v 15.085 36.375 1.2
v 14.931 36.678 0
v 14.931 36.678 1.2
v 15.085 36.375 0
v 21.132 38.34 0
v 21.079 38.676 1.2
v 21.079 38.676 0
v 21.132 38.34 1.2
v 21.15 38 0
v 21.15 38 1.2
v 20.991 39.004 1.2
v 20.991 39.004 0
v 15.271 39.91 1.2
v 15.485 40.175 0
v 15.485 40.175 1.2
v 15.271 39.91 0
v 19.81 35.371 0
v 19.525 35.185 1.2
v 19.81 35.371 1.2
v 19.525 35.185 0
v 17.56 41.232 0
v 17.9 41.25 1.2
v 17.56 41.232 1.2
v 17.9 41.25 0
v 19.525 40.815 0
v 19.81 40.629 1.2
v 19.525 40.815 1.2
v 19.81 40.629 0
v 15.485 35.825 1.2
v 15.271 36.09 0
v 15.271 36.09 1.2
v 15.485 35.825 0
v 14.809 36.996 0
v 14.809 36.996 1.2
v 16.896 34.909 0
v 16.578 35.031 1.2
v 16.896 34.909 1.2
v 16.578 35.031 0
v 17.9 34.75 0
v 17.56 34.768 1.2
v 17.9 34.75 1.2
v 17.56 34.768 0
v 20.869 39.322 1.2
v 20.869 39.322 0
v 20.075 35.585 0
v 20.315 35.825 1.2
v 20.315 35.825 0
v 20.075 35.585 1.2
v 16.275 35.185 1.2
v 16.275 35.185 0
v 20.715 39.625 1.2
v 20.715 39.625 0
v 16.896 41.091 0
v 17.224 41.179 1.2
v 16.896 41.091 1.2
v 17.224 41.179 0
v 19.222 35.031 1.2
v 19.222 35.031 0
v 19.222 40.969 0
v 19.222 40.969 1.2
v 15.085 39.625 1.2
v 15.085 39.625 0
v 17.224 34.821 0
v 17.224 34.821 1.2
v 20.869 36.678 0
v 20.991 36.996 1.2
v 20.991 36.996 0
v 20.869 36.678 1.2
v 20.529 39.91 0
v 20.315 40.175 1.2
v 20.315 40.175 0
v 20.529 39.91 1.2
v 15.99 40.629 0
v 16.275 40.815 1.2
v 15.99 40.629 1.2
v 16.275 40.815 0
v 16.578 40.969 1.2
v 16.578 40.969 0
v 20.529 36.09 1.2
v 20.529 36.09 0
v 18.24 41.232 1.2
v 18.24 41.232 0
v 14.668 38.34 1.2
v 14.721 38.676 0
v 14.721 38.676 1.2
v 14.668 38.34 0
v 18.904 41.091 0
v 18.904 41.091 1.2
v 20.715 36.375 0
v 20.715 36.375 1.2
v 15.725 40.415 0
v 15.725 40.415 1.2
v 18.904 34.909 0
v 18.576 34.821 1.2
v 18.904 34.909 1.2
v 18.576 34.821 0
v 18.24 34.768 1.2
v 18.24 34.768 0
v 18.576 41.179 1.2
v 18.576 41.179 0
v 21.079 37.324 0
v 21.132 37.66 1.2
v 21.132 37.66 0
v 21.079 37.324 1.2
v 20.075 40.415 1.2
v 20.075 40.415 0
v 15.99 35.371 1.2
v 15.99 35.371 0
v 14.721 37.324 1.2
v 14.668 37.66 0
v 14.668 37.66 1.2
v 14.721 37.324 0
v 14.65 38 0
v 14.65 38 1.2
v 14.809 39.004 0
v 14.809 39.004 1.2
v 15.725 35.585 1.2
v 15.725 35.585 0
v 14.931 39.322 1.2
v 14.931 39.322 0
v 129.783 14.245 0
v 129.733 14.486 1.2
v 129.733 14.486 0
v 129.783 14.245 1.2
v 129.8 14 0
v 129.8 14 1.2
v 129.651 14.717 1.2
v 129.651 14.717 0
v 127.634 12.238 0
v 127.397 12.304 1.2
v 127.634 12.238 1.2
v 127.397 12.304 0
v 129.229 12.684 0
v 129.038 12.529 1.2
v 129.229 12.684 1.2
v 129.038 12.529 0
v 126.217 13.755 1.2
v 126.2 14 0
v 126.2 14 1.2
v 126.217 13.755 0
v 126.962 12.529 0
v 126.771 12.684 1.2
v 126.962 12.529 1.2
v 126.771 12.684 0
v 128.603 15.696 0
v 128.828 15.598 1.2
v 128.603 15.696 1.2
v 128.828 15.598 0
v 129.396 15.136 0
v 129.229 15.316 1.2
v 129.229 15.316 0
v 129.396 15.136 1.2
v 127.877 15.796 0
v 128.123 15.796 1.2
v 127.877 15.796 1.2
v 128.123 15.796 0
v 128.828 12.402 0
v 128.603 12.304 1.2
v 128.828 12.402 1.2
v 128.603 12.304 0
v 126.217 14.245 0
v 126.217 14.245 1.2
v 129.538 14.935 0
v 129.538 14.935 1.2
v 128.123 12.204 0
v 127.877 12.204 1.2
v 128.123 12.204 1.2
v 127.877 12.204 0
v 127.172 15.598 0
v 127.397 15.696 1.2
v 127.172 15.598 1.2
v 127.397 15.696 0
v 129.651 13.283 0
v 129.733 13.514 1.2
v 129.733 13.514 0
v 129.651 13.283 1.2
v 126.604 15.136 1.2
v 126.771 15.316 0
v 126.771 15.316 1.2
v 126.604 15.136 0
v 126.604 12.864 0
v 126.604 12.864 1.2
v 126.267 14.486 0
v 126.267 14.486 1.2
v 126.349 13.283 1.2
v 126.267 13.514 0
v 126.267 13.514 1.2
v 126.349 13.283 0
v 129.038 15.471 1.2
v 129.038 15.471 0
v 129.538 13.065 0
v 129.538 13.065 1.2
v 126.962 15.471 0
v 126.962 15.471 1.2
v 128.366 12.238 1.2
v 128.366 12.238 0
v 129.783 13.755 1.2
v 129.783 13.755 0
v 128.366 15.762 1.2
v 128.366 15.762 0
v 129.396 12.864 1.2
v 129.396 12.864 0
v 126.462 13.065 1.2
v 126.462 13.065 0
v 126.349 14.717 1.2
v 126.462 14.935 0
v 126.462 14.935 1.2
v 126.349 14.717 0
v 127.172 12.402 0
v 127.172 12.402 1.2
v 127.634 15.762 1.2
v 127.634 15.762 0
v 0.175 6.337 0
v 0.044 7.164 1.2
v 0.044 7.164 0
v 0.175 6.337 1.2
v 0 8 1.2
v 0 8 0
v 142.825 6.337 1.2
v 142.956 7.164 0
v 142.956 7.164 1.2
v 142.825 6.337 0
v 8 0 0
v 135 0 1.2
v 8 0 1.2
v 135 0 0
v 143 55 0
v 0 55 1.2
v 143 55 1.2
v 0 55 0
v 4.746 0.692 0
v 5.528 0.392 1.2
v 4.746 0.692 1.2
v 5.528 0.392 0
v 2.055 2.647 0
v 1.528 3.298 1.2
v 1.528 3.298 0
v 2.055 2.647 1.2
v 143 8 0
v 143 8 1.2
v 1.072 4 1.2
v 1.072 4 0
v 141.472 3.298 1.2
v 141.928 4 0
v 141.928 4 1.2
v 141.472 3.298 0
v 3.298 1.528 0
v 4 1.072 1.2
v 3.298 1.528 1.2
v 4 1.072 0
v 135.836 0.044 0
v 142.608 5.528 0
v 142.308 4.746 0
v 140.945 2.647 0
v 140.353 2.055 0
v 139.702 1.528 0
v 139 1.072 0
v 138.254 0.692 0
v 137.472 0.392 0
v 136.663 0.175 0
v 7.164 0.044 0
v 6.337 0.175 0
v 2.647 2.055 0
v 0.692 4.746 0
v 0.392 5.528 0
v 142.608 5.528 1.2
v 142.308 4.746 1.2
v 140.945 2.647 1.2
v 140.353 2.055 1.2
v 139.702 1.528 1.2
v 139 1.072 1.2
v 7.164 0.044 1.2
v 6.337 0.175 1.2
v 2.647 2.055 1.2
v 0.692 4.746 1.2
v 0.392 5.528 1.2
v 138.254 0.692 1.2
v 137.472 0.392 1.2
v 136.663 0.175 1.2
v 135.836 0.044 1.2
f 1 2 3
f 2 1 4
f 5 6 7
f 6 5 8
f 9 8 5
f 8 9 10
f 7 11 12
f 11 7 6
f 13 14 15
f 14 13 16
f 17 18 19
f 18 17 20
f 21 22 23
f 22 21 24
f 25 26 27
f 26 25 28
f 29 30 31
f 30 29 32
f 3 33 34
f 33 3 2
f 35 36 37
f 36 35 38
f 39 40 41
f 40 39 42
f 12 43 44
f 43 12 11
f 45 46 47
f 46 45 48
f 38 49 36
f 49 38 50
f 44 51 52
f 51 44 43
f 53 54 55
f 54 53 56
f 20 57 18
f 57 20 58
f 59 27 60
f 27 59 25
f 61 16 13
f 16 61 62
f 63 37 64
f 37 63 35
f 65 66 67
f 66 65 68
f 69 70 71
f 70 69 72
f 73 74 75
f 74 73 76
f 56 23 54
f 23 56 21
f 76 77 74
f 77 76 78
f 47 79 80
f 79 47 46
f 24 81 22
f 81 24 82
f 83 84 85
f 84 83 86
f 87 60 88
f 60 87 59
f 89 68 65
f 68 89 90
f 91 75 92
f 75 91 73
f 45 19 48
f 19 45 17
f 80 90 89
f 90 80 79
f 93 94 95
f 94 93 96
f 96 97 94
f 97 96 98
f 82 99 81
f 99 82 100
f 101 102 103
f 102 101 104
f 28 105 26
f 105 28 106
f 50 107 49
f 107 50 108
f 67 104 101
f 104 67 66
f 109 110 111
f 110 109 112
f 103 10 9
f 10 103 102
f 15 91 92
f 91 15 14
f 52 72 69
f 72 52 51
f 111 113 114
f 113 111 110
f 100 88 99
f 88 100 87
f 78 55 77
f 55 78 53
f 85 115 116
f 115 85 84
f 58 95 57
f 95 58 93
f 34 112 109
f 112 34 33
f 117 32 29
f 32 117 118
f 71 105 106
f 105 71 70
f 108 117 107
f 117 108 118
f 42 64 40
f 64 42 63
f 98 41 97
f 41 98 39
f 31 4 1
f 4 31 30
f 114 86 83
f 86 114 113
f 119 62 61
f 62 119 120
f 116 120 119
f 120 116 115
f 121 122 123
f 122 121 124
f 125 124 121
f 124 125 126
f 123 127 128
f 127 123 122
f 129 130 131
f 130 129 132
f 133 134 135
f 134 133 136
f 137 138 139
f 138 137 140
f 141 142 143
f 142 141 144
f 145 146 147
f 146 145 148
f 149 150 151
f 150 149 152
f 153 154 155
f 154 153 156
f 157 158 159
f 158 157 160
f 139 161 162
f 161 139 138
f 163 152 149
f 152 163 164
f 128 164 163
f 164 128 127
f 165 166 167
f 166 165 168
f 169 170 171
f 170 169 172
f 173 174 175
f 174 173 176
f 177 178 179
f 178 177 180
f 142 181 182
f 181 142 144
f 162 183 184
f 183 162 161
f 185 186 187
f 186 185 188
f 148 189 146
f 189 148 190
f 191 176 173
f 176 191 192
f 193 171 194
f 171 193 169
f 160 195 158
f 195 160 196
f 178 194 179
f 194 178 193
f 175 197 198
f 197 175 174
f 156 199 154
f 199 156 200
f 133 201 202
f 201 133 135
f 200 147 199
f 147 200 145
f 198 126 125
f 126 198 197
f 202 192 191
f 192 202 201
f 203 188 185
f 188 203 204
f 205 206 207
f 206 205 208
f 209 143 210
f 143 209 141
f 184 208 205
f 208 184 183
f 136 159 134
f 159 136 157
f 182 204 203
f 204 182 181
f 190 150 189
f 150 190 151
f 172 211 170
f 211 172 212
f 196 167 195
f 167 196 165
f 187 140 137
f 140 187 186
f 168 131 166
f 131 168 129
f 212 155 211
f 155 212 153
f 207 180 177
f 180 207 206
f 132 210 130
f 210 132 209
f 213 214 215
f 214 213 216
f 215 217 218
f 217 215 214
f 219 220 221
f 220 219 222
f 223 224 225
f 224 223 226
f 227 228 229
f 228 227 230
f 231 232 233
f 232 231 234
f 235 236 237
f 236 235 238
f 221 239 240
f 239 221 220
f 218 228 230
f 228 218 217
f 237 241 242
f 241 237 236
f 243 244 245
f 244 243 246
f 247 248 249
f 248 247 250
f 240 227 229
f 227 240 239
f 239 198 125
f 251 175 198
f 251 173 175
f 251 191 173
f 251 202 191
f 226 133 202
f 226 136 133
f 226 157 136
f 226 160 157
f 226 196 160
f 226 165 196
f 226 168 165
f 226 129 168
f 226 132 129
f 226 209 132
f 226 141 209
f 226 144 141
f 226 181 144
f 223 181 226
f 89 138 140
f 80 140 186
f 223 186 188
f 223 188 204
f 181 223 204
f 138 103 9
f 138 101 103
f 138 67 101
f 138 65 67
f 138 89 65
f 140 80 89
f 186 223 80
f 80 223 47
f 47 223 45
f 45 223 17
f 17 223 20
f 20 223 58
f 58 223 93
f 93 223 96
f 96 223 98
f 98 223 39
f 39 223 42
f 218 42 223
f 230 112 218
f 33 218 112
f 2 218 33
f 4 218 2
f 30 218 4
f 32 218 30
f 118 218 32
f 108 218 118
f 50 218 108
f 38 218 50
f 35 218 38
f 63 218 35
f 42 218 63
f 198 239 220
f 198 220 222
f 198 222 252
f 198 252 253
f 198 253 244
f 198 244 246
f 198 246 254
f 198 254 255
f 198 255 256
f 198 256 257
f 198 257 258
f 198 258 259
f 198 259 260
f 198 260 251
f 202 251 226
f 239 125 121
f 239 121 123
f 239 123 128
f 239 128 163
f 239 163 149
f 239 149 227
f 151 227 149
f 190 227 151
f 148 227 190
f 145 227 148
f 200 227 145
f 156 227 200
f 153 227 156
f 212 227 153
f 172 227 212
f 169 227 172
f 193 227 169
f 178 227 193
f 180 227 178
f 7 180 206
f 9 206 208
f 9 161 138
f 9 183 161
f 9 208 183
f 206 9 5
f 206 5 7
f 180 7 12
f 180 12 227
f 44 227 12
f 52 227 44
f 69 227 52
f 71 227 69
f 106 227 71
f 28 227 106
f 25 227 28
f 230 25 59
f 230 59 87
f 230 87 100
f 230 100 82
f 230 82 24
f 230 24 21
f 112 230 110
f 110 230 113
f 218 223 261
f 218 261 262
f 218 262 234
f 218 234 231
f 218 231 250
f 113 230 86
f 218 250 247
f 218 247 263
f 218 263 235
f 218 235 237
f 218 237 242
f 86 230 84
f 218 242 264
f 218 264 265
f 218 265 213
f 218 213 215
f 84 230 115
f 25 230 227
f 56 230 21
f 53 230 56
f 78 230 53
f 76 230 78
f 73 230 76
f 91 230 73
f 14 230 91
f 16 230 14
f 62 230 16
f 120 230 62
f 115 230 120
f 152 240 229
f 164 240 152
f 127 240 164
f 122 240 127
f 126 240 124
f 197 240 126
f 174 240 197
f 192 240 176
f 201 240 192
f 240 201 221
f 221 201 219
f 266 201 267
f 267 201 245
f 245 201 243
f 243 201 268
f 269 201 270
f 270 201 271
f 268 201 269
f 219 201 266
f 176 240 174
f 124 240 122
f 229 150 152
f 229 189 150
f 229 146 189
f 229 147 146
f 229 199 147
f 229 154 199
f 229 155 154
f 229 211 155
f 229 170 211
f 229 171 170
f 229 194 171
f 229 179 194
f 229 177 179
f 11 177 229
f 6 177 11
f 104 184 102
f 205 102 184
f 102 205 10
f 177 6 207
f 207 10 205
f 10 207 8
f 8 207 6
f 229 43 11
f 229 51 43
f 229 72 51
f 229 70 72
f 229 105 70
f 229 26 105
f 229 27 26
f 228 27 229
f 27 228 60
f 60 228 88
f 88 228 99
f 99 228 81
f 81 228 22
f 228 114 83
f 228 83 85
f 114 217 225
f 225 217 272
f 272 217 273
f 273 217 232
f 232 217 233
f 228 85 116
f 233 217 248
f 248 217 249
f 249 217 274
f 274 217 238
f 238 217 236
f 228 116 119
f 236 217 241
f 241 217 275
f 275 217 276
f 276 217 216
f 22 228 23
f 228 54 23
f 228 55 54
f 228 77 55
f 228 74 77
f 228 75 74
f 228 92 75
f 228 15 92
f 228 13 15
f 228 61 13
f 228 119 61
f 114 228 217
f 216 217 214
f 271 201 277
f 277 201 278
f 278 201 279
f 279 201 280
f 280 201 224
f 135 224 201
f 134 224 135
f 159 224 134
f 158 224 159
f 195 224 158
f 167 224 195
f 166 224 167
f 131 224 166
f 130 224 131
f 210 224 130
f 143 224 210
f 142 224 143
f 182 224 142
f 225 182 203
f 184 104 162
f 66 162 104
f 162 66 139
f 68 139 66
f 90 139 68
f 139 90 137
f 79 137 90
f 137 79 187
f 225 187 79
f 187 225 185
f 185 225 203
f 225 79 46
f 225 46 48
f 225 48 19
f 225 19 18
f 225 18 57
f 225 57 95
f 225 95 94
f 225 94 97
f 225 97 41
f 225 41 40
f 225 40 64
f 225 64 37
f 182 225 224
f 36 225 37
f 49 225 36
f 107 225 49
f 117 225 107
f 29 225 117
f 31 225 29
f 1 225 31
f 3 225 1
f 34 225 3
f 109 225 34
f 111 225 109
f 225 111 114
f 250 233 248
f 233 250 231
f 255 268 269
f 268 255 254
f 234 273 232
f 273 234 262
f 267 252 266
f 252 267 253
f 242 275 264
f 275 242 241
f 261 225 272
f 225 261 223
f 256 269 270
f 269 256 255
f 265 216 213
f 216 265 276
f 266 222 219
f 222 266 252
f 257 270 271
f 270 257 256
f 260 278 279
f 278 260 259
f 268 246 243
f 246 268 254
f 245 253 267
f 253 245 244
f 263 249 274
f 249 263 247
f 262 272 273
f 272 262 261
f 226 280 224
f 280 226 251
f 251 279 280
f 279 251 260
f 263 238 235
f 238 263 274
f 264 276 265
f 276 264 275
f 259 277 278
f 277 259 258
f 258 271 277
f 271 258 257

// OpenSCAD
// =============================================
// 3D: nux mighty air cover
// Version: 1.0
// Author: generator
// =============================================

description = "Thin cover plate 140.9x52x1 mm, bottom corners R5, two holes";
version_str = "1.0";

// ----------------------------
// Фрагменты: назовите элементы короткими именами с _
// - base: основная деталь
// - TODO: top_pad, base_pad, wrap_left, main_wall: примеры имён
// ----------------------------

// Параметры модели (position: front at XZ axis, top view at XY, side view at YZ)
// base x, y, z указаны для внешних габаритов. Внутренние размеры меньше на ширину стенок
// ----------------------------
base_x = 143; // ширина X, мм, width
base_y = 55; // глубина Y, мм
base_z = 1.2; // толщина пластины по Z, мм
base_h = base_z; // для clip_for_fragments()
base_th = 1; // толщина стенки (не используется здесь)
radius_r = 8; // скругление только у нижних углов
mink_r = 0; // не используется

// Отверстия
big_hole_x = 17.9;  // 16.9 мм (от левого края)
big_hole_y = 38;    // 34 мм (от нижнего края)

small_hole_x = 128; // 127 мм
small_hole_y = 14;  // 11 мм

// Джек-модули (отдельные детали рядом с основной пластиной)
height_to_body = 15; // высота над плоскостью
height_to_deep = 3; // глубина под плоскостью (суммарная высота = 30)
small_jack_d = 3.5 + 0.2;
big_jack_d   = 6.3 + 0.3;
small_hole_d = small_jack_d - 0.1;
big_hole_d = big_jack_d - 0.1;
small_jack_cap_d = small_hole_d * 1.5; // диаметр маленькой шляпки
big_jack_cap_d   = big_hole_d * 1.5; // диаметр большой шляпки
jack_cap_th = 0.6;

// Флаги печати
print_body  = true;  // печатать основную пластину
print_jacks = false;  // печатать джек-цилиндры и их крышки

// Включение деталей для вывода
print_base = true; // print base
print_cap = true; // print cap
// TODO: print vars for each detail

// ----------------------------




use <../modules.scad>;

// ----------------------------
// Настройка точности
// ----------------------------
$fn = 0;        // фиксированную сегментацию отключаем
$fa = 6;        // 5–8° обычно достаточно
$fs = 0.35;     // ≈ диаметр сопла (0.3–0.5 для сопла 0.4)
pin_fs = 0.25;  // чуть тоньше для штырей и отверстий

// ===== Режим печати тест‑фрагментов =====
test_fragment = false;   // true — печатать только угловые фрагменты
frag_size     = 20;      // размер квадрата вырезки, мм
frag_index    = 0;       // 0=НЛ, 1=ВЛ, 2=НП, 3=ВП
frag_gap_x    = 10;      // зазор между фрагментами по X, мм
frag_h_extra  = 20;      // запас по высоте клипа, мм

// ===== Общие доп. параметры =====
tiny = 0.1;                  // небольшой зазор для булевых операций
edge_chamfer_z = 1;          // высота фаски по Z (мм)
edge_chamfer_x = 5;          // горизонтальный вылет фаски по X (мм)
edge_chamfer_y = 5;          // горизонтальный вылет фаски по Y (мм)
screen_frame_gap = 0.2;      // только для высоты вычитаний

// ----------------------------
// Вычисляемые переменные
// ----------------------------
// TODO:
walls_th = 2 * base_th;
cap_x = base_x + walls_th + walls_th;
cap_y = base_y + walls_th + walls_th;
cap_th = base_th;
cap_z = cap_th * 3;

// ----------------------------
// Модули фрагментов модели
// ----------------------------

// 2D прямоугольник со скруглением только по нижним углам (min Y)
module rounded_rect_min_y(size=[10,10], r=2){
    L = size[0];
    W = size[1];
    rr = min(r, min(L/2, W));
    hull(){
        // верхний прямоугольник сохраняет острые верхние углы
        translate([0, rr]) square([L, max(W - rr, eps())], center=false);
        // нижние углы — четверти окружности
        translate([rr, rr]) circle(r=rr);
        translate([L - rr, rr]) circle(r=rr);
    }
}

module plate_2d(){
    rounded_rect_min_y([base_x, base_y], r=radius_r);
}

module cover_plate(){
    linear_extrude(height=base_z)
        plate_2d();
}

module holes(){
    // Сквозные отверстия
    translate([big_hole_x, big_hole_y, -tiny])
        cylinder(h=base_z + 2*tiny, d=big_hole_d, $fs=pin_fs, $fa=6);
    translate([small_hole_x, small_hole_y, -tiny])
        cylinder(h=base_z + 2*tiny, d=small_hole_d, $fs=pin_fs, $fa=6);
}

module cover(){
    difference(){
        cover_plate();
        holes();
    }
}

// ----------------------------
// Джек-элементы (отдельные детали)
// ----------------------------
module small_jack(){
    cylinder(h=height_to_body + height_to_deep, d=small_jack_d, $fs=pin_fs, $fa=6);
}

module big_jack(){
    cylinder(h=height_to_body + height_to_deep, d=big_jack_d, $fs=pin_fs, $fa=6);
}

module small_jack_cap(){
    cylinder(h=jack_cap_th, d=small_jack_cap_d, $fs=pin_fs, $fa=6);
}

module big_jack_cap(){
    cylinder(h=jack_cap_th, d=big_jack_cap_d, $fs=pin_fs, $fa=6);
}

// Вывод всех деталей
module all_details(){
    if (print_body) cover();

    if (print_jacks){
        // Расположим справа от пластины, с зазором frag_gap_x
        col1_x = base_x + frag_gap_x;                       // колонка 1 (small)
        col2_x = col1_x + max(small_jack_d, small_jack_cap_d) + frag_gap_x; // колонка 2 (big)
        row_gap_y = frag_gap_x;                              // вертикальный зазор

        // Small jack + cap
        translate([col1_x, 0, 0]) small_jack();
        translate([col1_x, 0, 0]) small_jack_cap();

        // Big jack + cap
        translate([col2_x, 0, 0]) big_jack();
        translate([col2_x, 0, 0]) big_jack_cap();
    }
}

// Final rotate/translate
module orient(){
    translate([0,0,0]) rotate([0,0,0]) children();
}

// ----------------------------
// ВЫВОД МОДЕЛИ
// ----------------------------
module render(){
    clip_for_fragments_bbox(base_x, base_y, base_z, enabled=test_fragment, frag_size=frag_size, frag_index=frag_index, frag_h_extra=frag_h_extra){
        orient(){ all_details(); }
    }
}

render();
